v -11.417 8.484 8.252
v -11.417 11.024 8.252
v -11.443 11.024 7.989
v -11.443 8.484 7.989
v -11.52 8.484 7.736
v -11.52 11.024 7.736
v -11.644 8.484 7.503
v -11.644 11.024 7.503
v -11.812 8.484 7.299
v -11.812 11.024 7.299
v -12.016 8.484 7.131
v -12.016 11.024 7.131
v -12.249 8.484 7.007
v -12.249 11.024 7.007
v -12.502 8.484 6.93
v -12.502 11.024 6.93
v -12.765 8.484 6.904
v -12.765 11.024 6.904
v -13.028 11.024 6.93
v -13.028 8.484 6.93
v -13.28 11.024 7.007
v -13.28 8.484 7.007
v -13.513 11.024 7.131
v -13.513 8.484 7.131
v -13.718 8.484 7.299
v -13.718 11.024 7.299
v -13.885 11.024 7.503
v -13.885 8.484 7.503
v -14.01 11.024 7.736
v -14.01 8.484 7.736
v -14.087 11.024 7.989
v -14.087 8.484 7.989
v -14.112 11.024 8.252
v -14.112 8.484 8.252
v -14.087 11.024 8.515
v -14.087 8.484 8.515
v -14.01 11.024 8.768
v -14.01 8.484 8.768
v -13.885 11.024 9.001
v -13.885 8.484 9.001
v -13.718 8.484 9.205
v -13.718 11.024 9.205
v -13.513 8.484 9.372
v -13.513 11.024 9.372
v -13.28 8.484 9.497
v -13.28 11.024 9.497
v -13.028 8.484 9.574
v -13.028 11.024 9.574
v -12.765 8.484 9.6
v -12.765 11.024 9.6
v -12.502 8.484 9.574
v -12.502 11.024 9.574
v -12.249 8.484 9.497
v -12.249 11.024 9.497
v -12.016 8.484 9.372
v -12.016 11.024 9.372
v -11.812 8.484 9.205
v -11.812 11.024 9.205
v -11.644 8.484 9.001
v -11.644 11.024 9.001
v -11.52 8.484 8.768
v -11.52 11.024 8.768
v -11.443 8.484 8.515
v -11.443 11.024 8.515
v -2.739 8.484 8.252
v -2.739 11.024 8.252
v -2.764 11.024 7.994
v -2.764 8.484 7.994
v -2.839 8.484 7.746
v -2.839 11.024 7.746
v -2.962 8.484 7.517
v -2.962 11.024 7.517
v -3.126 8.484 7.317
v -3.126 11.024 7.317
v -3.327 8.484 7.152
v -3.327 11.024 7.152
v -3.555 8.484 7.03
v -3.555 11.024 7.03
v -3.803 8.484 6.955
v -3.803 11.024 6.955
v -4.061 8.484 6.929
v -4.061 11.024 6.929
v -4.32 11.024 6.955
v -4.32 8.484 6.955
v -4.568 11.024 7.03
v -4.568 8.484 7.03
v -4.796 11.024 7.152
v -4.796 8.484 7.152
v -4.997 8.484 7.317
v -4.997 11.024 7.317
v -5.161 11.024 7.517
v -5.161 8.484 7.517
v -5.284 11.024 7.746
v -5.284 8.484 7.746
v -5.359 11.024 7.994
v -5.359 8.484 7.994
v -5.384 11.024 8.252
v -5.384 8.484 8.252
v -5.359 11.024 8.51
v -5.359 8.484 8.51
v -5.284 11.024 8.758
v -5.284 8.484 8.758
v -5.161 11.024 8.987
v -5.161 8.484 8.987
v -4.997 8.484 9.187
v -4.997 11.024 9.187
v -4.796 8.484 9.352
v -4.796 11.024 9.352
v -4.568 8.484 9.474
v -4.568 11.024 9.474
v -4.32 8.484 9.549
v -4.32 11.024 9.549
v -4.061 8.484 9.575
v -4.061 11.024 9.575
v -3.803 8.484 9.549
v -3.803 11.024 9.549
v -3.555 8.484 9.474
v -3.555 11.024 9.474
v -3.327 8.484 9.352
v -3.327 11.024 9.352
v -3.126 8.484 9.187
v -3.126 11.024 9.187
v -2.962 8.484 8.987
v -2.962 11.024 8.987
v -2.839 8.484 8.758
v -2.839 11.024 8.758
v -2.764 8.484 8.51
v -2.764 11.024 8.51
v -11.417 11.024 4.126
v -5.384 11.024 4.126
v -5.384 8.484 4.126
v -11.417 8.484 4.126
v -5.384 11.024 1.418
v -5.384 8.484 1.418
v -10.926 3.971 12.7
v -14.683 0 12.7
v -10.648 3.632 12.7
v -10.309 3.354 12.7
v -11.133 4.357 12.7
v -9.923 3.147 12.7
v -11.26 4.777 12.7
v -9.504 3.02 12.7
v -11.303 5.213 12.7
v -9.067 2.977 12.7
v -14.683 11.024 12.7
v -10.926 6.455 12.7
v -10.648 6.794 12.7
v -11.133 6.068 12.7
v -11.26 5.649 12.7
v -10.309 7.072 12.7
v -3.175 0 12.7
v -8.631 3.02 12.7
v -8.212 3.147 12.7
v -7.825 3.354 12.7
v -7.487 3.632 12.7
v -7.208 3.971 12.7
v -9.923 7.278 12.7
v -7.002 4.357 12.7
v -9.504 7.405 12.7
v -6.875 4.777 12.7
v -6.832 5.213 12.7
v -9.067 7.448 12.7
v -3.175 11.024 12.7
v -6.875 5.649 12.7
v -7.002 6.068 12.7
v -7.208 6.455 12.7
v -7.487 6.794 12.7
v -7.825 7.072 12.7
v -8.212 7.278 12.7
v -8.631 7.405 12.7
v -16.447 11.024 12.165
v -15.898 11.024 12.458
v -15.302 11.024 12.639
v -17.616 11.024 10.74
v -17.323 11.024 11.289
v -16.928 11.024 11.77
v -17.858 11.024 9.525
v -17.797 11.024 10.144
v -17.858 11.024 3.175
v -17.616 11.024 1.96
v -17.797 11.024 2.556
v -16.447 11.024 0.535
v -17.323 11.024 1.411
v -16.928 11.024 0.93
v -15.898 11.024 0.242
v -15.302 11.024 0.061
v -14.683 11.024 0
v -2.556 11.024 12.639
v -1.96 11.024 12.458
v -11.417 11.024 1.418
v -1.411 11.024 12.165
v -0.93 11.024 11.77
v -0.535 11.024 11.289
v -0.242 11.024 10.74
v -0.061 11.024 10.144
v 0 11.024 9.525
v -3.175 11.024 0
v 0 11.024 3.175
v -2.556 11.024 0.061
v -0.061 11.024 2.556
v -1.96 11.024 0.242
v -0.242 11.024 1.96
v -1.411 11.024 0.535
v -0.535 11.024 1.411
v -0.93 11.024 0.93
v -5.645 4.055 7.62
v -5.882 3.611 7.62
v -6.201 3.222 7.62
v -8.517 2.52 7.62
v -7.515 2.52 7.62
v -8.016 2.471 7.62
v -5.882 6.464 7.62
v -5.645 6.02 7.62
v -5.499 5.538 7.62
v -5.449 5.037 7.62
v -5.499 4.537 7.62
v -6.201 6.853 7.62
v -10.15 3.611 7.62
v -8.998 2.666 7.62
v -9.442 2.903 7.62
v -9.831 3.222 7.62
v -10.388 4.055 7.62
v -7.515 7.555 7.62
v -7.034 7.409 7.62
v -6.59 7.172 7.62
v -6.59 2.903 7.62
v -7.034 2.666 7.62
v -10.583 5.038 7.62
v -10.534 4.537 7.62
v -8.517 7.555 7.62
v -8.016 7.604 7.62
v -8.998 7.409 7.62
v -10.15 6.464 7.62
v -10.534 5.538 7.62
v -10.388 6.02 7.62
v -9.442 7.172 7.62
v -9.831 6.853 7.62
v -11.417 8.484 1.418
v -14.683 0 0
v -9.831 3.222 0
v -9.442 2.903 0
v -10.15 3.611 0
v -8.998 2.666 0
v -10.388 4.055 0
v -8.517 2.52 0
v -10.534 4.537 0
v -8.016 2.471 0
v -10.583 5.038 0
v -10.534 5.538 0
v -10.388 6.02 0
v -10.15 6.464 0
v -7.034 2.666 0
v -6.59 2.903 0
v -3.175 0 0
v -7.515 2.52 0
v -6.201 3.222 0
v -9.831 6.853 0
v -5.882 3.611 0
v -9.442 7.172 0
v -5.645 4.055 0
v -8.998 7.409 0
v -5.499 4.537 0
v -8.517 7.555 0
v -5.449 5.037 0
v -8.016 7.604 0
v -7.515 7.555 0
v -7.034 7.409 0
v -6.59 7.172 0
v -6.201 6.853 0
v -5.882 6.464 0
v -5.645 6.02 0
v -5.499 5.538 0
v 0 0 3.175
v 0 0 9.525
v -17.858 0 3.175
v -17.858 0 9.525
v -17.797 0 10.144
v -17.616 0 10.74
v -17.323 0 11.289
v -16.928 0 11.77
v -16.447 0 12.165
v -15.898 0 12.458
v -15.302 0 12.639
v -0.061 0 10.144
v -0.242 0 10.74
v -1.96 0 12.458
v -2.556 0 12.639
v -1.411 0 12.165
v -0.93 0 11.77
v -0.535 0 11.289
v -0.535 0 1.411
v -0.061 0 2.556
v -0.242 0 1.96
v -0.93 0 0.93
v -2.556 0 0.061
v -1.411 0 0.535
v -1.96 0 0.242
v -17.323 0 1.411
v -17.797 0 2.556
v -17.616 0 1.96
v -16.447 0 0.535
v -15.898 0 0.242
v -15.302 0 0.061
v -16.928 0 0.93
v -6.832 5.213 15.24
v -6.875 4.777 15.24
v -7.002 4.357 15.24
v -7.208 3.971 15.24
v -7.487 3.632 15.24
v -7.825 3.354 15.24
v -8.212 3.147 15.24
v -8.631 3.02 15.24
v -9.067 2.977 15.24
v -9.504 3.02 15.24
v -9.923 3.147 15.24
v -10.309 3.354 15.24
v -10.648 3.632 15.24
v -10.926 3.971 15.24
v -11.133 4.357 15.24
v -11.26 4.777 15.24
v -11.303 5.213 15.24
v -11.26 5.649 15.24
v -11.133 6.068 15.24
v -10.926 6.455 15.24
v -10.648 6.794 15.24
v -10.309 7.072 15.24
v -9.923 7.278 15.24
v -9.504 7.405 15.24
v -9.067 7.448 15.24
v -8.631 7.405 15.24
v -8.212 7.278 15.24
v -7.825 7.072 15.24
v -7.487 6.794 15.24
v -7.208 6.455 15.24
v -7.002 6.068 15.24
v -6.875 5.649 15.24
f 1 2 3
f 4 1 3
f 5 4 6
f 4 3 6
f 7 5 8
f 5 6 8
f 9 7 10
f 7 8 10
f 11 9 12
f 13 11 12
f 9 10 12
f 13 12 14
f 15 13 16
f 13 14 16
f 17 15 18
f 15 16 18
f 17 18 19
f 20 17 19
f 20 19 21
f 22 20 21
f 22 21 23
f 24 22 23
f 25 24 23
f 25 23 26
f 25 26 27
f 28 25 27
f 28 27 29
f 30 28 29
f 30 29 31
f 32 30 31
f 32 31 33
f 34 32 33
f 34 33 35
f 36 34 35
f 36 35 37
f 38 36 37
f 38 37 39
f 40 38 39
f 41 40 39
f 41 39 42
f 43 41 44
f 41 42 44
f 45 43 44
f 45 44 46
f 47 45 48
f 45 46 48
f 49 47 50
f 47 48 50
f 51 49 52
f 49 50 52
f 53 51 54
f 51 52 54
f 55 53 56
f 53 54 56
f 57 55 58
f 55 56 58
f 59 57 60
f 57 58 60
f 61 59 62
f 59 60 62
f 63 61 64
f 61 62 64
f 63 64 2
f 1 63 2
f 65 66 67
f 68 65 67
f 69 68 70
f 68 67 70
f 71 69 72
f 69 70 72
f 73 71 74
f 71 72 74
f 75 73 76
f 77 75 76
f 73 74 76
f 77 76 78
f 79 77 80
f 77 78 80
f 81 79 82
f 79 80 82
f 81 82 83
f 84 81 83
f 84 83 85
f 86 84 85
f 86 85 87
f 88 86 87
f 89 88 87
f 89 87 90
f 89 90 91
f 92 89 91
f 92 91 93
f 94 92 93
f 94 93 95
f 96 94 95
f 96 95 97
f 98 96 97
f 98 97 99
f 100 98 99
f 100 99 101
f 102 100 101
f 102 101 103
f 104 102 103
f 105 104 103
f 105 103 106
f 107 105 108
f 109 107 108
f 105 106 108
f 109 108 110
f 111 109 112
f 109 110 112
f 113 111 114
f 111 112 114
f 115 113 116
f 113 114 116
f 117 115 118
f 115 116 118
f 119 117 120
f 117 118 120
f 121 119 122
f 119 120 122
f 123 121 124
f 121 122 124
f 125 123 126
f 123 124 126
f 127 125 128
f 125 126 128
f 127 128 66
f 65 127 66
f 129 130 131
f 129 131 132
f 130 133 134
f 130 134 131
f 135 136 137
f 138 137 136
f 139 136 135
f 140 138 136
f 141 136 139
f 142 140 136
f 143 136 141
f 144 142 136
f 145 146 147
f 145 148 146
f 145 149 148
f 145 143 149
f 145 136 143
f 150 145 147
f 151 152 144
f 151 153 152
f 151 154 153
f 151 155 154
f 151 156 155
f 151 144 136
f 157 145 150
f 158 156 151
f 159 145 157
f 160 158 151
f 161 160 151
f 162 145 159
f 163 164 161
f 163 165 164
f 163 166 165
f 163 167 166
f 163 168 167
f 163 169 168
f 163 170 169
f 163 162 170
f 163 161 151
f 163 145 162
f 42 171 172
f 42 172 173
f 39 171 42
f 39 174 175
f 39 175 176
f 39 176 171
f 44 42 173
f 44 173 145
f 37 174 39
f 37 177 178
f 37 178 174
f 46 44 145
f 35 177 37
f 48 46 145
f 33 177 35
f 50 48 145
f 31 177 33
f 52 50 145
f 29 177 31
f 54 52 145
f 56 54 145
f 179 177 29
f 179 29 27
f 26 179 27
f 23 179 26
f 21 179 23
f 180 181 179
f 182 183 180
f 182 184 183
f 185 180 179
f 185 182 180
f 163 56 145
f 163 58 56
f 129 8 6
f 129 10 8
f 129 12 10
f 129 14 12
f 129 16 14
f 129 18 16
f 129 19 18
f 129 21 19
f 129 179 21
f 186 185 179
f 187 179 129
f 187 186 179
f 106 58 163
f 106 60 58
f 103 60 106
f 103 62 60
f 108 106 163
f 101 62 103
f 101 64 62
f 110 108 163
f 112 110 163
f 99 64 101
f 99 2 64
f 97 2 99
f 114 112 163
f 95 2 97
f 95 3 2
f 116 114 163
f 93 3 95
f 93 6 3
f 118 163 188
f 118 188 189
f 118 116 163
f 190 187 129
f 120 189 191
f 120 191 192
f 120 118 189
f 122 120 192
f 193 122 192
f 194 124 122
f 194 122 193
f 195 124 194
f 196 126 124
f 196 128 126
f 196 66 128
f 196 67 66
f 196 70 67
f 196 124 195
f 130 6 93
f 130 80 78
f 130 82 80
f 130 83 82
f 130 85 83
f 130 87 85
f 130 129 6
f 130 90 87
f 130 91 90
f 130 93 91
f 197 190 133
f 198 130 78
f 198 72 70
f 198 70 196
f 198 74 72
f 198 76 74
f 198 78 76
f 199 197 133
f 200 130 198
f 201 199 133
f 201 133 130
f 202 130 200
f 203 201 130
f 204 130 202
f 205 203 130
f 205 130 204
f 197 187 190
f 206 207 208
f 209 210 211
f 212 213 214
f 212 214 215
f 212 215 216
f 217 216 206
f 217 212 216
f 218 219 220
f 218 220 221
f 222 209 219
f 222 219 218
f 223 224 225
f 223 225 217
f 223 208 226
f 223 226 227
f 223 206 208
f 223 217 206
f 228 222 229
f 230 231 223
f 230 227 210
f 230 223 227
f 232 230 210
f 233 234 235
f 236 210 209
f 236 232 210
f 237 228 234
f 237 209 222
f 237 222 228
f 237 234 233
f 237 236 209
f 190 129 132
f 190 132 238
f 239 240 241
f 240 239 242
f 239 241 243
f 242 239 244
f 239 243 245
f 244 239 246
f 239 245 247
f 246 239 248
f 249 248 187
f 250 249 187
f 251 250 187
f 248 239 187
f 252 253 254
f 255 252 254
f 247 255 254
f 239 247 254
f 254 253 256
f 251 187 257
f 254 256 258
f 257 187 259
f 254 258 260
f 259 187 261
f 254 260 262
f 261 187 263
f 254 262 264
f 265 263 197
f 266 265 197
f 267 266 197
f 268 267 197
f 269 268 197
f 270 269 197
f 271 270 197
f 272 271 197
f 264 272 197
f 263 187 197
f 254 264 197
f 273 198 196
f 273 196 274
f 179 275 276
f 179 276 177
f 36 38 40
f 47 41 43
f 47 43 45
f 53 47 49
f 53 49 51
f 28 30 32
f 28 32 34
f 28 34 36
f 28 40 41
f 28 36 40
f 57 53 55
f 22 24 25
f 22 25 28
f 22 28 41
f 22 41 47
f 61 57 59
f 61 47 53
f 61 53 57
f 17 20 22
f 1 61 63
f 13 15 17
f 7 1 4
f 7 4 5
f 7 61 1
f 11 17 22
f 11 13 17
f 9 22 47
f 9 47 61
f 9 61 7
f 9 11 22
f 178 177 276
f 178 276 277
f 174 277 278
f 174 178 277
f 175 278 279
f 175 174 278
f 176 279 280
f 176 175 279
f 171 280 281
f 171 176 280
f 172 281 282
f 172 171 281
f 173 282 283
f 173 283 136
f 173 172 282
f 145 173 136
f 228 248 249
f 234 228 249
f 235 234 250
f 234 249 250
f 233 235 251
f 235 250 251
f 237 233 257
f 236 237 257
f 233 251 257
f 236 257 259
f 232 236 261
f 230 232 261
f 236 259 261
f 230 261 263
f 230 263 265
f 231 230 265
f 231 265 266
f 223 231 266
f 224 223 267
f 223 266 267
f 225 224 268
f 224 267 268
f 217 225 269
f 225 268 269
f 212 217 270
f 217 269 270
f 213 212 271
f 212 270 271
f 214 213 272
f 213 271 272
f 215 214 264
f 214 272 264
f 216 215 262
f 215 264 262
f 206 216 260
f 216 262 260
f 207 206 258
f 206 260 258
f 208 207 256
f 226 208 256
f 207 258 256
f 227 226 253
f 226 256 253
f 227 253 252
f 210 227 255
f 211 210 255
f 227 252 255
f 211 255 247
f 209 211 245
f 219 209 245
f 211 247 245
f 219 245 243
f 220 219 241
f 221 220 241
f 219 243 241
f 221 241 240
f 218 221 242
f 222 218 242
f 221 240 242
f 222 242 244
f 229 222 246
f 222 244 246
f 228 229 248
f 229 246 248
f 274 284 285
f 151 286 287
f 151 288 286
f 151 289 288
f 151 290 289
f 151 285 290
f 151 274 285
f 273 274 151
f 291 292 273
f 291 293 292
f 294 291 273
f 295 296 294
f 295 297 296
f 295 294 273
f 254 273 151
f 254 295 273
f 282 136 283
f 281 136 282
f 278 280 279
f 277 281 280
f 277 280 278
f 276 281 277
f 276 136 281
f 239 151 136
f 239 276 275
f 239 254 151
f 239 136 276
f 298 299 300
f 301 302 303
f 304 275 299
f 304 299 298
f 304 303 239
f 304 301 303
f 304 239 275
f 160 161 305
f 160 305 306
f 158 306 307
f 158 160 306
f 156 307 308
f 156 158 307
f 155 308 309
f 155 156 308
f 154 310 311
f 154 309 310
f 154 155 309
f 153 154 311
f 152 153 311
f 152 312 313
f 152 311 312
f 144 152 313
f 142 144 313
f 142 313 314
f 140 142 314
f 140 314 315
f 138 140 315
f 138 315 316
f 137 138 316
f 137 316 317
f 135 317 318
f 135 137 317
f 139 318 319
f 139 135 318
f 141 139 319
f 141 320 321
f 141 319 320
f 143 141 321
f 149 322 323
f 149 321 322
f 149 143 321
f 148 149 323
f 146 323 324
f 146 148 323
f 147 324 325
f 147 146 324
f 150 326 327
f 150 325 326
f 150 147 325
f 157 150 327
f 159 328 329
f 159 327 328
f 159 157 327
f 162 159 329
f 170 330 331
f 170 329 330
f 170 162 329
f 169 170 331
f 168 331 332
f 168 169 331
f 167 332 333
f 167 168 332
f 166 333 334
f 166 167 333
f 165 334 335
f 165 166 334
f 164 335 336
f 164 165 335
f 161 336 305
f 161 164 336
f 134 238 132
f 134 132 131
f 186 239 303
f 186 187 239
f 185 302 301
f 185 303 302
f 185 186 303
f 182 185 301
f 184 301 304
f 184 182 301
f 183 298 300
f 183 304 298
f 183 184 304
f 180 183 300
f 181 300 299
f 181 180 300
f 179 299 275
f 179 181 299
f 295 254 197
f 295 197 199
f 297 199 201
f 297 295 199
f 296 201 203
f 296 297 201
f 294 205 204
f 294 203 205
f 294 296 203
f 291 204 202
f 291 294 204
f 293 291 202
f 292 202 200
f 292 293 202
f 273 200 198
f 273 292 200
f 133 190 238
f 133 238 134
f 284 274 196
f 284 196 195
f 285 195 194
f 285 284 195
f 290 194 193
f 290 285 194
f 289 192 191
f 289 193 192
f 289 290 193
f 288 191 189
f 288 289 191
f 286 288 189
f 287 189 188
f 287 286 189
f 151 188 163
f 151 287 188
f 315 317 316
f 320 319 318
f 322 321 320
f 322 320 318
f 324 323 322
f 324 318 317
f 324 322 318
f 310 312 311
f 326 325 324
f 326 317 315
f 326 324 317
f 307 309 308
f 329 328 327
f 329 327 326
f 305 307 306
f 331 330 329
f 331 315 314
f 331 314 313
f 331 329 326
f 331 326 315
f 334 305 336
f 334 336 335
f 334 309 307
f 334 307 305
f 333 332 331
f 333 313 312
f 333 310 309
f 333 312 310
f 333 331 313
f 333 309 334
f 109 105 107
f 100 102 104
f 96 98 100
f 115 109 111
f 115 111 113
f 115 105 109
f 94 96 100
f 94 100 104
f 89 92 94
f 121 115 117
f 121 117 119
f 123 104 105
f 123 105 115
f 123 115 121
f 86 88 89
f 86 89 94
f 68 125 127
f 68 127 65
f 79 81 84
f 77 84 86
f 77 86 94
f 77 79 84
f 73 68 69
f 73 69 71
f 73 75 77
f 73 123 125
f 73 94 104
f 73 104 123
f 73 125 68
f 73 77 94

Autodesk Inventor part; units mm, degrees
ref_plane "YZ Plane" through (0, 0, 0) normal (1, 0, 0) x (0, 1, 0)
ref_plane "XZ Plane" through (0, 0, 0) normal (0, 1, 0) x (-1, 0, 0)
ref_plane "XY Plane" through (0, 0, 0) normal (0, 0, 1) x (1, 0, 0)
sketch "Sketch1" plane through (0, 0, 0) normal (0, 0, 1) x (1, 0, 0)
  line L0 (0, 0) -> (-17.8576, 0)
  line L1 (-17.8576, 0) -> (-17.8576, 11.024)
  line L2 (-17.8576, 11.024) -> (0, 11.024)
  line L3 (0, 11.024) -> (0, 0)
extrude "Extrusion1" add sketch "Sketch1" along normal blind 12.7
sketch "Sketch2" plane through (-17.8576, 11.024, 0) normal (0, 1, 0) x (1, 0, 0)
  circle A0 centre (13.7961, -8.2519) radius 1.3228
  circle A1 centre (5.0929, -8.2519) radius 1.3477
  line L0 (12.4733, -4.1259) -> (6.4406, -4.1259)
  line L1 (6.4406, -4.1259) -> (6.4406, -1.4183)
  line L2 (6.4406, -1.4183) -> (12.4733, -1.4183)
  line L3 (12.4733, -1.4183) -> (12.4733, -4.1259)
  point P0 (17.8576, 0)
extrude "Extrusion2" cut sketch "Sketch2" against normal blind 2.54
fillet "Fillet1" radius 3.175 1 edges at (-17.8576, 5.512, 12.7)
fillet "Fillet2" radius 3.175 1 edges at (-17.8576, 5.512, 0)
fillet "Fillet3" radius 3.175 1 edges at (0, 5.512, 12.7)
fillet "Fillet4" radius 3.175 1 edges at (0, 5.512, 0)
sketch "Sketch3" plane through (0, 0, 0) normal (0, 0, -1) x (-1, 0, 0)
  circle A0 centre (8.0161, 5.0375) radius 2.5669
  point P0 (0, 0)
extrude "Extrusion3" cut sketch "Sketch3" against normal blind 7.62
sketch "Sketch4" plane through (0, 0, 12.7) normal (0, 0, 1) x (1, 0, 0)
  circle A0 centre (-9.0674, 5.2127) radius 2.2357
  point P0 (0, 0)
extrude "Extrusion4" add sketch "Sketch4" along normal blind 2.54
properties part number "finalface4"
